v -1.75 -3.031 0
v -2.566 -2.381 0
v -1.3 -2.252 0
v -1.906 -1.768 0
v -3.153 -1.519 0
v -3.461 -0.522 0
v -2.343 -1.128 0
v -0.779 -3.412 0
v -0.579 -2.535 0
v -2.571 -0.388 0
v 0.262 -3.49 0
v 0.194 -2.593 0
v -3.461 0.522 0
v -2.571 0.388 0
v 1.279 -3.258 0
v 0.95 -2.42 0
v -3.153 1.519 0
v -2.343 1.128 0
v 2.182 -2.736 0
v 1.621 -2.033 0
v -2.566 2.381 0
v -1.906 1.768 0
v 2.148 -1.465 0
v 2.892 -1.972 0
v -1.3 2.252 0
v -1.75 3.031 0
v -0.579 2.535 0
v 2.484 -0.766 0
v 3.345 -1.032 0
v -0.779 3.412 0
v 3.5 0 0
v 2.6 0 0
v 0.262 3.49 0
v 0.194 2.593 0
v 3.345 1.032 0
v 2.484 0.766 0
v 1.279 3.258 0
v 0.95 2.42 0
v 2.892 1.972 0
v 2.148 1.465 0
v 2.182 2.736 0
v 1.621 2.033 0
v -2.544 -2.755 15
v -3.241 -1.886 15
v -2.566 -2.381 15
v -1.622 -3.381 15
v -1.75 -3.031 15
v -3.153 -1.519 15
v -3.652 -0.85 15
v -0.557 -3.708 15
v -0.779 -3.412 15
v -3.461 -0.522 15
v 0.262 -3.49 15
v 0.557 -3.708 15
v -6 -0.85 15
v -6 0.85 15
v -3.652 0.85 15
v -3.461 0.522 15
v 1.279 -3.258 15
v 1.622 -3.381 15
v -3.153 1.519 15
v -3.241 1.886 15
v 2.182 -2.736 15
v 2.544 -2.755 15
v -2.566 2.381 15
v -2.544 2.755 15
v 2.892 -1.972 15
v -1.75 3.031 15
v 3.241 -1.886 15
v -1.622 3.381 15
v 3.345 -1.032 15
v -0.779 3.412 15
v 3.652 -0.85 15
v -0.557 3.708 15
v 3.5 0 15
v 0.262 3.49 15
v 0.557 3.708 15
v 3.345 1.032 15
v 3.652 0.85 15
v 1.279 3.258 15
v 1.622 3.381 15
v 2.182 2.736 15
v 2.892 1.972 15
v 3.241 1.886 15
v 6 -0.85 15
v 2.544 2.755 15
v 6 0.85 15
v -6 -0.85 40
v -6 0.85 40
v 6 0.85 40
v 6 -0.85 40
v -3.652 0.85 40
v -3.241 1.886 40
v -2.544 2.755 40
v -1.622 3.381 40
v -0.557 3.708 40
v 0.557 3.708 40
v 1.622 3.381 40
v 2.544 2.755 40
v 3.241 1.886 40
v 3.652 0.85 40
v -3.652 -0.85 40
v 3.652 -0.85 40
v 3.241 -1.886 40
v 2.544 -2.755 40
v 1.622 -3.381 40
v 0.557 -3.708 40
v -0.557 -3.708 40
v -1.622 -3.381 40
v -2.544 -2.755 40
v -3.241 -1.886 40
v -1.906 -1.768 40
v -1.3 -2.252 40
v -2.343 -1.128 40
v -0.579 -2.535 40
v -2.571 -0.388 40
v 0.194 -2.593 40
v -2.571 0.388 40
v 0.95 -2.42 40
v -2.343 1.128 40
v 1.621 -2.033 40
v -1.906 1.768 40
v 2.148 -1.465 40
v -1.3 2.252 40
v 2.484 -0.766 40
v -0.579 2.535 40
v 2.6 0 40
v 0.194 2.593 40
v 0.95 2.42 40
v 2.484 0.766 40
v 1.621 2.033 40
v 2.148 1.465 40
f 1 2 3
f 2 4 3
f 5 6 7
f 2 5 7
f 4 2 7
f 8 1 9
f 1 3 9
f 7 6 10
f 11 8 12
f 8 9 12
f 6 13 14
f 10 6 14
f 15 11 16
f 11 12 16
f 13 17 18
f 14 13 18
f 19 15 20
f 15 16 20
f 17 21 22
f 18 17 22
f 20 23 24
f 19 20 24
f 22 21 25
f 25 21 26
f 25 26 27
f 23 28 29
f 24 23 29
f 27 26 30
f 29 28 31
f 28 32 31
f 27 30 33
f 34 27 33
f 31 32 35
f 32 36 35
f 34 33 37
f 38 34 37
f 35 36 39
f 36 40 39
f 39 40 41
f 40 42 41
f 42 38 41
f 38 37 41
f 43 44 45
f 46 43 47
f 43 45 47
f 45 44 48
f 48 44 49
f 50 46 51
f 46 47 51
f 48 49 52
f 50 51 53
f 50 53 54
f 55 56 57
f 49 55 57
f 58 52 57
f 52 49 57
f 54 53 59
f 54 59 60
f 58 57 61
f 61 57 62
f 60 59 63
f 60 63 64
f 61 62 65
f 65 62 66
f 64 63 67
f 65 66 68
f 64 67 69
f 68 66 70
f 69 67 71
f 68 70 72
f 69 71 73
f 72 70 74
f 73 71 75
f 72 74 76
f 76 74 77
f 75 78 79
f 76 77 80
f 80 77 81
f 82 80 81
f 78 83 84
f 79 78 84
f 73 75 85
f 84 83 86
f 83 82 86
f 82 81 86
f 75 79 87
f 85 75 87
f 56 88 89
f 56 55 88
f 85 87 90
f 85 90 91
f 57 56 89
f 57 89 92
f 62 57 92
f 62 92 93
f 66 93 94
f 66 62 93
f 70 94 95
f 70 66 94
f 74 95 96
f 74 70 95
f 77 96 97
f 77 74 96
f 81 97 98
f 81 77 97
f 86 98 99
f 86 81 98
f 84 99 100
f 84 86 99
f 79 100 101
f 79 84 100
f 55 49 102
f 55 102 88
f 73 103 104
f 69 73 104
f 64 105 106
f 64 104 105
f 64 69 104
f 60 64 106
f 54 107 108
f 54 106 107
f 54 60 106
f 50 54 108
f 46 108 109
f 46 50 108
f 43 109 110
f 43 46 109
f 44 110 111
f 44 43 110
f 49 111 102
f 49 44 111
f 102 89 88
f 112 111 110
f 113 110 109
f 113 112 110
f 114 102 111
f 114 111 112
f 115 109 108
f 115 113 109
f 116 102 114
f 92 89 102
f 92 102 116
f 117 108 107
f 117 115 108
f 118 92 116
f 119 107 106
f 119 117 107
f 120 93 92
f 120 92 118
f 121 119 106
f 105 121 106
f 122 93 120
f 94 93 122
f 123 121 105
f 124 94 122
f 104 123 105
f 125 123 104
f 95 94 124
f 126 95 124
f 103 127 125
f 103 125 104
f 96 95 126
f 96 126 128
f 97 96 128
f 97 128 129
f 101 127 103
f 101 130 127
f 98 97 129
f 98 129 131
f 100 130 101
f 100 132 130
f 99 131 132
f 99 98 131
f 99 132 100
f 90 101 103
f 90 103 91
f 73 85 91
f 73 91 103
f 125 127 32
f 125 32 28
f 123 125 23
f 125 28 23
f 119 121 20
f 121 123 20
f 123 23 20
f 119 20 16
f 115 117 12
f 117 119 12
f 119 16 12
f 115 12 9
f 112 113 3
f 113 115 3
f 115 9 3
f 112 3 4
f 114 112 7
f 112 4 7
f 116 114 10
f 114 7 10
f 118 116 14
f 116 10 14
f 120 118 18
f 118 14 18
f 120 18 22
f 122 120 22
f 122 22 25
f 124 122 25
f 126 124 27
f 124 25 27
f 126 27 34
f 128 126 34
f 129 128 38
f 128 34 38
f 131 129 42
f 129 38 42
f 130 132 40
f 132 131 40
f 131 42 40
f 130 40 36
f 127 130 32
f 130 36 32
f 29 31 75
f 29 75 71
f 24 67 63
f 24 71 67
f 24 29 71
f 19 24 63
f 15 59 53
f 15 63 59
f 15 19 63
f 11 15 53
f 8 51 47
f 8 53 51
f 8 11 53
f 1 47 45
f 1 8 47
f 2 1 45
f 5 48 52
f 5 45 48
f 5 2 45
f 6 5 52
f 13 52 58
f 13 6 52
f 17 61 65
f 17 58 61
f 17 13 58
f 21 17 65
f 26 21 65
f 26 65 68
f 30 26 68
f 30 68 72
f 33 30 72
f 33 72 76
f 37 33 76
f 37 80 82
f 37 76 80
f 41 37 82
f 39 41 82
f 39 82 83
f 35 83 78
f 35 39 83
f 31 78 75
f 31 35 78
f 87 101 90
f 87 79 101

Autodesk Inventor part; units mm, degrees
ref_plane "YZ Plane" through (0, 0, 0) normal (1, 0, 0) x (0, 1, 0)
ref_plane "XZ Plane" through (0, 0, 0) normal (0, 1, 0) x (-1, 0, 0)
ref_plane "XY Plane" through (0, 0, 0) normal (0, 0, 1) x (1, 0, 0)
sketch "Sketch1" plane through (0, 0, 0) normal (0, 0, 1) x (1, 0, 0)
  circle A0 centre (0, 0) radius 2.6
  circle A1 centre (0, 0) radius 3.5
  dimension "d0" = 5.2
  dimension "d1" = 7
extrude "Extrusion1" add sketch "Sketch1" along normal blind 15
sketch "Sketch2" plane through (0, 0, 15) normal (0, 0, 1) x (1, 0, 0)
  circle A0 centre (0, 0) radius 2.6 projected
  circle A1 centre (0, 0) radius 3.75
  line L0 (-6, 0.85) -> (6, 0.85)
  line L1 (6, 0.85) -> (6, -0.85)
  line L2 (6, -0.85) -> (-6, -0.85)
  line L3 (-6, -0.85) -> (-6, 0.85)
  line L4 (-6, 0.85) -> (6, -0.85) construction
  line L5 (6, 0.85) -> (-6, -0.85) construction
  point P0 (-3.6524, 0.85)
  point P1 (-3.6524, -0.85)
  point P2 (3.6524, -0.85)
  point P3 (3.6524, 0.85)
  dimension "d4" = 7.5
  dimension "d5" = 12
  dimension "d6" = 1.7
extrude "Extrusion2" add sketch "Sketch2" along normal blind 25 contours A0 L0 A1 L2 | A0 L0 A1 | L2 A1 A0 | A0 L2 A1 L0 | L0 L1 L2 A1 | A1 L2 L3 L0
sketch "Sketch3" plane through (0, 0, 0) normal (0, 0, -1) x (-1, 0, 0)
  point P0 (0, 0)
properties part number "final pin_3DPrint"
